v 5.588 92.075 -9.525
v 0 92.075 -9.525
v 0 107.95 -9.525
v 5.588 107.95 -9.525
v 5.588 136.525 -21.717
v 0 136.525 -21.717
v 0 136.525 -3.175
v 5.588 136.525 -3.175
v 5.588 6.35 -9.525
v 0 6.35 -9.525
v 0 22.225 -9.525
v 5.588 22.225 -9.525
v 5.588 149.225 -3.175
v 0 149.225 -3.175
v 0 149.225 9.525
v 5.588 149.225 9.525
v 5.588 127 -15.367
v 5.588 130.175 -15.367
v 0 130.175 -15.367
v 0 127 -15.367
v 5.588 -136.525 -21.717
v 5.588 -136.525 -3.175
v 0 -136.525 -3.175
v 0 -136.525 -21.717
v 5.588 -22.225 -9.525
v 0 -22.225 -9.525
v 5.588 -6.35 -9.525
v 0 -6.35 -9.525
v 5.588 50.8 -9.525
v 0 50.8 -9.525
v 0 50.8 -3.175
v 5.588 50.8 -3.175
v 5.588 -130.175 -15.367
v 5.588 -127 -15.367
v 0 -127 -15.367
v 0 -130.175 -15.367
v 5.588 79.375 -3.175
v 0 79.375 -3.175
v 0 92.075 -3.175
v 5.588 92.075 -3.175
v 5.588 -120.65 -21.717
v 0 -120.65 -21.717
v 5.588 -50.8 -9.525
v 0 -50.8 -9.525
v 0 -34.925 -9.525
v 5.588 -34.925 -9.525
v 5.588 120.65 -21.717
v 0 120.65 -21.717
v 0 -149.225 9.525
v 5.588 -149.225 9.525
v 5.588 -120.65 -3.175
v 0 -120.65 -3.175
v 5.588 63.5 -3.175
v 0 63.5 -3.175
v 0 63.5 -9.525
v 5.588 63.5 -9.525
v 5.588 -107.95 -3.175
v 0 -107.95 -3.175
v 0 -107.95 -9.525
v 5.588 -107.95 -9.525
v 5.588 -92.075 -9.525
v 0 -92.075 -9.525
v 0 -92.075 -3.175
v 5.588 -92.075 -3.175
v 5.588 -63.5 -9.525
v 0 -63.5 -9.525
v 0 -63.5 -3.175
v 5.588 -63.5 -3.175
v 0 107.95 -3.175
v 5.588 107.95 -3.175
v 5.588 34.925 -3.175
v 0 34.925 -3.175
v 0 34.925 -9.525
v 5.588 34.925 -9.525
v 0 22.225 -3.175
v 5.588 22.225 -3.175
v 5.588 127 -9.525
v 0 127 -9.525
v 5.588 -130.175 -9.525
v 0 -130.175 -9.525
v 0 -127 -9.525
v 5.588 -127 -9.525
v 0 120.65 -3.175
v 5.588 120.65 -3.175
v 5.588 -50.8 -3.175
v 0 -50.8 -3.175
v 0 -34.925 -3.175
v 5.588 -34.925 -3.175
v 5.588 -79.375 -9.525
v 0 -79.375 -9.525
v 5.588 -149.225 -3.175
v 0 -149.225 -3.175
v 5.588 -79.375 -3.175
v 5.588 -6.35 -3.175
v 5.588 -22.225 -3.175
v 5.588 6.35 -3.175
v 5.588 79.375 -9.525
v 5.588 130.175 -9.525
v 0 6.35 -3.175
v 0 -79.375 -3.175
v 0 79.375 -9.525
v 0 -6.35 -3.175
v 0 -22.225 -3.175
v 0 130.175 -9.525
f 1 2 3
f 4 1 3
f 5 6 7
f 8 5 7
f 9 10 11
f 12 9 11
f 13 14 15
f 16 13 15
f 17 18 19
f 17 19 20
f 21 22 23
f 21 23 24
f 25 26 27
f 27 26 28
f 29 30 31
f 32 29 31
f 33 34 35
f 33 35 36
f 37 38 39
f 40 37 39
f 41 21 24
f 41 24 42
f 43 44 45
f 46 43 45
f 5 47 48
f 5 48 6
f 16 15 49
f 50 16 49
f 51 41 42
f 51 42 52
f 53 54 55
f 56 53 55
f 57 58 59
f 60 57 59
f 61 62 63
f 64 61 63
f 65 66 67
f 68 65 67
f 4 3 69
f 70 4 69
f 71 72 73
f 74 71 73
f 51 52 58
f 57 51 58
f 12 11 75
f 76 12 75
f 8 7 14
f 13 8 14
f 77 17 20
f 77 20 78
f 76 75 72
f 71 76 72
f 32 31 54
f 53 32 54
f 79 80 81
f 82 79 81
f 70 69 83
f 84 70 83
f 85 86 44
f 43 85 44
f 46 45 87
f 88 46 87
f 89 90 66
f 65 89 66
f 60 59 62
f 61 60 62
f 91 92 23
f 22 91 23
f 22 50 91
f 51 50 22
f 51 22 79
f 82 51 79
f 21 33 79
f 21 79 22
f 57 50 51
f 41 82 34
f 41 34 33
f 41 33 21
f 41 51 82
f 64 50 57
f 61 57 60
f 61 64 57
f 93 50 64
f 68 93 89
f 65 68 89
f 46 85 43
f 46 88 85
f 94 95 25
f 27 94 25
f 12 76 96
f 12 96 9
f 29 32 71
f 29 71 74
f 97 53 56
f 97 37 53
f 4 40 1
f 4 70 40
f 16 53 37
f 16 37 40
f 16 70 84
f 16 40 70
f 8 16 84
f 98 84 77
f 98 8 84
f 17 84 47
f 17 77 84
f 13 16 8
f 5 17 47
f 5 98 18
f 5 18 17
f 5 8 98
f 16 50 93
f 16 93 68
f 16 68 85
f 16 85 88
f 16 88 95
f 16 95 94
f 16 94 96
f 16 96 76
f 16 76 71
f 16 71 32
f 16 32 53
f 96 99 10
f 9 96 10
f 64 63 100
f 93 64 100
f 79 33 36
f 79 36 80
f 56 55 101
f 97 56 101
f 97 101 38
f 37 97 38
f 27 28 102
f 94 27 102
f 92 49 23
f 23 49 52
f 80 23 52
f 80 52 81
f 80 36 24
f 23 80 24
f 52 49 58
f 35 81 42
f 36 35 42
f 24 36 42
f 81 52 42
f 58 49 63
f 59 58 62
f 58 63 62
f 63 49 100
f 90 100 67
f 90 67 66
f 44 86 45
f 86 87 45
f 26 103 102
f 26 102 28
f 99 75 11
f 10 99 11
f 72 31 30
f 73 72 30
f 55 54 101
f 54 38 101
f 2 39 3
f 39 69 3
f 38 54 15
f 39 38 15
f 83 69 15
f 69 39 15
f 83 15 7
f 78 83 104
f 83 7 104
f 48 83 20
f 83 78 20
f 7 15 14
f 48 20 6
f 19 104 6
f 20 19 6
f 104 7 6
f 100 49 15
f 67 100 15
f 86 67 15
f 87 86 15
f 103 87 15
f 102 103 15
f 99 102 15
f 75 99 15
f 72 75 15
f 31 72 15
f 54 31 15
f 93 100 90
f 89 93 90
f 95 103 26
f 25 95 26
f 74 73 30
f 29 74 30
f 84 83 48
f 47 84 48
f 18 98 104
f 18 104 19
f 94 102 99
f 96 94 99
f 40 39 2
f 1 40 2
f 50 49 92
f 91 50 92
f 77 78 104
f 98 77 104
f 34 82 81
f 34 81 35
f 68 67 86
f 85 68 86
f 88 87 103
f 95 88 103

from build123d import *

# Parameters (mm, degrees)
BOSS_EXTRUDE1_DEPTH = 5.588
BOSS_EXTRUDE2_DEPTH = 5.588


with BuildPart() as part:
    # Sketch1 → Boss-Extrude1 (new body)
    with BuildSketch(Plane(origin=(0, 0, 0), x_dir=(0, 0, -1), z_dir=(1, 0, 0))):
        Polygon((3.175, 120.65), (9.525, 120.65), (9.525, 136.525), (3.175, 136.525), (3.175, 149.225), (-9.525, 149.225), (-9.525, -149.225), (3.175, -149.225), (3.175, -136.525), (9.525, -136.525), (9.525, -120.65), (3.175, -120.65), (3.175, -107.95), (9.525, -107.95), (9.525, -92.075), (3.175, -92.075), (3.175, -79.375), (9.525, -79.375), (9.525, -63.5), (3.175, -63.5), (3.175, -50.8), (9.525, -50.8), (9.525, -34.925), (3.175, -34.925), (3.175, -22.225), (9.525, -22.225), (9.525, -6.35), (3.175, -6.35), (3.175, 6.35), (9.525, 6.35), (9.525, 22.225), (3.175, 22.225), (3.175, 34.925), (9.525, 34.925), (9.525, 50.8), (3.175, 50.8), (3.175, 63.5), (9.525, 63.5), (9.525, 79.375), (3.175, 79.375), (3.175, 92.075), (9.525, 92.075), (9.525, 107.95), (3.175, 107.95), align=None)
    extrude(amount=BOSS_EXTRUDE1_DEPTH)

    # Sketch2 → Boss-Extrude2 (add)
    with BuildSketch(Plane(origin=(5.588, 0, 0), x_dir=(0, 0, -1), z_dir=(1, 0, 0))):
        Polygon((21.717, -120.65), (9.525, -120.65), (9.525, -127), (15.367, -127), (15.367, -130.175), (9.525, -130.175), (9.525, -136.525), (21.717, -136.525), align=None)
        Polygon((21.717, 136.525), (9.525, 136.525), (9.525, 130.175), (15.367, 130.175), (15.367, 127), (9.525, 127), (9.525, 120.65), (21.717, 120.65), align=None)
    extrude(amount=-BOSS_EXTRUDE2_DEPTH)


solid = part.part
